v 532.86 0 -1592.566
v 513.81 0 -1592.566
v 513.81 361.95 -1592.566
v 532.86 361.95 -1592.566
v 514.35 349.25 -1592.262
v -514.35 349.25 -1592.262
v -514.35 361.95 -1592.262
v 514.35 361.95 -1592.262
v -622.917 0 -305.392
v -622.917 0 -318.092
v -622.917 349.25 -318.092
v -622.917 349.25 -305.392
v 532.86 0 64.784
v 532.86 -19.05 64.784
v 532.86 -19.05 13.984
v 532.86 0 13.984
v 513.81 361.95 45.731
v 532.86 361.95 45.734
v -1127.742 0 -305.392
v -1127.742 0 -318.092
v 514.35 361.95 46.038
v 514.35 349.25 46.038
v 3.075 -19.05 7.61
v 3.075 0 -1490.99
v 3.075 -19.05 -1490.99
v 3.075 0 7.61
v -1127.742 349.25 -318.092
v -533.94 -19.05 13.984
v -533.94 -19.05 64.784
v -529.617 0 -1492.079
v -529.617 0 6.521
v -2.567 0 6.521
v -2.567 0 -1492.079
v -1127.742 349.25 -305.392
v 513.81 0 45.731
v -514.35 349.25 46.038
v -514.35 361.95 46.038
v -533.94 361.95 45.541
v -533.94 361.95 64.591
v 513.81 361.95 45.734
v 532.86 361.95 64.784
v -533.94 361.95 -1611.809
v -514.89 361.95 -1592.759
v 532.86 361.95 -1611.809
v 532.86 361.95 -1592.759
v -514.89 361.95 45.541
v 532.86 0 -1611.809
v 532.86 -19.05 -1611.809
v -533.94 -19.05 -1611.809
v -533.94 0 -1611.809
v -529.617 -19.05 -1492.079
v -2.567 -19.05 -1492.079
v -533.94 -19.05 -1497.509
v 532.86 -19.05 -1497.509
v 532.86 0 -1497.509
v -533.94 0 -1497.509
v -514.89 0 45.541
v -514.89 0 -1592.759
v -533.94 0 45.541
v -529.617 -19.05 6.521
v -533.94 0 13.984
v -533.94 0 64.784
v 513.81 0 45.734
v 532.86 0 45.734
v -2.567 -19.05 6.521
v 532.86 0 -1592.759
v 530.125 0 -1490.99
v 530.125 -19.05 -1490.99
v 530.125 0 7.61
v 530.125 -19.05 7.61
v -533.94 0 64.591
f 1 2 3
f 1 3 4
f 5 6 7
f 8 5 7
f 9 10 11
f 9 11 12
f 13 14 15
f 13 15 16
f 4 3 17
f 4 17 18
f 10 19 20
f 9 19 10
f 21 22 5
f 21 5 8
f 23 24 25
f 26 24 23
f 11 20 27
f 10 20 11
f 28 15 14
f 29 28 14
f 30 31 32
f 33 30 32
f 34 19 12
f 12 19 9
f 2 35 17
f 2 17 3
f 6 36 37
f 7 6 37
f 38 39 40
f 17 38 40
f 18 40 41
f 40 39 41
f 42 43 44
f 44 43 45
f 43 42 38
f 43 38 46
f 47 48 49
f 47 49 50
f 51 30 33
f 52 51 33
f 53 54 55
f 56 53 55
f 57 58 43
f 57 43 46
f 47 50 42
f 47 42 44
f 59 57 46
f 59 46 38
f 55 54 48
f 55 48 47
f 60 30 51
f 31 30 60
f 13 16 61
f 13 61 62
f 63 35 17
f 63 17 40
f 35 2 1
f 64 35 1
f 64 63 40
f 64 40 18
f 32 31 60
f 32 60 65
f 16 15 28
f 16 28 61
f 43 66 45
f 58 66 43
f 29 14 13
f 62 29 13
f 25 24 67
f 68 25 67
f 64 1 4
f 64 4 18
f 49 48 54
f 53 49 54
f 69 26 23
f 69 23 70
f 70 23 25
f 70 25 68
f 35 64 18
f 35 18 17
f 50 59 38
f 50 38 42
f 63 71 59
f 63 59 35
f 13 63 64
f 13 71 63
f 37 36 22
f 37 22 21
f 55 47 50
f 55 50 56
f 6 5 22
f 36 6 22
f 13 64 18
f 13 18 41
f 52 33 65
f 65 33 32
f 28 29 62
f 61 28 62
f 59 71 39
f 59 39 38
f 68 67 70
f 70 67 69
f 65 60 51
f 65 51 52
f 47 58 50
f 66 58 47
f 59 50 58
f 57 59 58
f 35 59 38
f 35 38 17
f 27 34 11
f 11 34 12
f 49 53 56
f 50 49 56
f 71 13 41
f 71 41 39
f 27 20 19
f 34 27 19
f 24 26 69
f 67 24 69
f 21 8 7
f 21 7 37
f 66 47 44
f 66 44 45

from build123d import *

# Parameters (mm, degrees)
F1_DEPTH = 361.95
F2_W     = 12.7
F2_H     = 1638.3
F3_DEPTH = 514.35
F4_W     = 19.05
F4_H     = 50.8
F4_H_2   = 114.3
F5_DEPTH = 1066.8
F6_W     = 527.05
F6_H     = 1498.6
F7_DEPTH = 19.05
F8_W     = 504.825
F8_H     = 12.7
F9_DEPTH = 349.25


with BuildPart() as f1:
    # F0 (on Front) → F1 (new body)
    with BuildSketch(Plane.XZ):
        Polygon((532.860258, 45.734084), (513.810258, 45.730643), (513.810258, -1141.908611), (513.810258, -1160.958611), (513.810258, -1592.565916), (532.860258, -1592.565916), align=None)
        Polygon((-514.889742, -1592.758611), (-533.939742, -1592.758611), (-533.939742, -1611.808611), (532.860258, -1611.808611), (532.860258, -1592.758611), align=None)
        Polygon((-514.889742, 45.541389), (-533.939742, 45.541389), (-533.939742, -1592.758611), (-514.889742, -1592.758611), (-514.889742, -1160.958611), (-514.889742, -1141.908611), align=None)
        Polygon((-533.939742, 64.591389), (-533.939742, 45.541389), (-10.064742, 45.636016), (513.810258, 45.730643), (513.810258, 45.734084), (532.860258, 45.734084), (532.860258, 64.784084), align=None)
    extrude(amount=-F1_DEPTH)


with BuildPart() as f3:
    # F2 (on Right) → F3 (new body, symmetric)
    with BuildSketch(Plane.YZ):
        with Locations((355.6, -773.111817)):
            Rectangle(F2_W, F2_H)
    extrude(amount=F3_DEPTH, both=True)


with BuildPart() as f5:
    # F4 (on face) → F5 (new body)
    with BuildSketch(Plane.YZ.offset(532.860258)):
        with Locations((-9.525, 39.384084)):
            Rectangle(F4_W, F4_H)
        with Locations((-9.525, -1554.658611)):
            Rectangle(F4_W, F4_H_2)
    extrude(amount=-F5_DEPTH)


with BuildPart() as f7:
    # F6 (on face) → F7 (new body)
    with BuildSketch(Plane.XZ):
        with Locations((-266.091704, -742.778577)):
            Rectangle(F6_W, F6_H)
        with Locations((266.60002, -741.689909)):
            Rectangle(F6_W, F6_H)
    extrude(amount=F7_DEPTH)


with BuildPart() as f9:
    # F8 (on Front) → F9 (new body)
    with BuildSketch(Plane.XZ):
        with Locations((-875.32979, -311.741516)):
            Rectangle(F8_W, F8_H)
    extrude(amount=-F9_DEPTH)


solid = Compound([f1.part, f3.part, f5.part, f7.part, f9.part])
